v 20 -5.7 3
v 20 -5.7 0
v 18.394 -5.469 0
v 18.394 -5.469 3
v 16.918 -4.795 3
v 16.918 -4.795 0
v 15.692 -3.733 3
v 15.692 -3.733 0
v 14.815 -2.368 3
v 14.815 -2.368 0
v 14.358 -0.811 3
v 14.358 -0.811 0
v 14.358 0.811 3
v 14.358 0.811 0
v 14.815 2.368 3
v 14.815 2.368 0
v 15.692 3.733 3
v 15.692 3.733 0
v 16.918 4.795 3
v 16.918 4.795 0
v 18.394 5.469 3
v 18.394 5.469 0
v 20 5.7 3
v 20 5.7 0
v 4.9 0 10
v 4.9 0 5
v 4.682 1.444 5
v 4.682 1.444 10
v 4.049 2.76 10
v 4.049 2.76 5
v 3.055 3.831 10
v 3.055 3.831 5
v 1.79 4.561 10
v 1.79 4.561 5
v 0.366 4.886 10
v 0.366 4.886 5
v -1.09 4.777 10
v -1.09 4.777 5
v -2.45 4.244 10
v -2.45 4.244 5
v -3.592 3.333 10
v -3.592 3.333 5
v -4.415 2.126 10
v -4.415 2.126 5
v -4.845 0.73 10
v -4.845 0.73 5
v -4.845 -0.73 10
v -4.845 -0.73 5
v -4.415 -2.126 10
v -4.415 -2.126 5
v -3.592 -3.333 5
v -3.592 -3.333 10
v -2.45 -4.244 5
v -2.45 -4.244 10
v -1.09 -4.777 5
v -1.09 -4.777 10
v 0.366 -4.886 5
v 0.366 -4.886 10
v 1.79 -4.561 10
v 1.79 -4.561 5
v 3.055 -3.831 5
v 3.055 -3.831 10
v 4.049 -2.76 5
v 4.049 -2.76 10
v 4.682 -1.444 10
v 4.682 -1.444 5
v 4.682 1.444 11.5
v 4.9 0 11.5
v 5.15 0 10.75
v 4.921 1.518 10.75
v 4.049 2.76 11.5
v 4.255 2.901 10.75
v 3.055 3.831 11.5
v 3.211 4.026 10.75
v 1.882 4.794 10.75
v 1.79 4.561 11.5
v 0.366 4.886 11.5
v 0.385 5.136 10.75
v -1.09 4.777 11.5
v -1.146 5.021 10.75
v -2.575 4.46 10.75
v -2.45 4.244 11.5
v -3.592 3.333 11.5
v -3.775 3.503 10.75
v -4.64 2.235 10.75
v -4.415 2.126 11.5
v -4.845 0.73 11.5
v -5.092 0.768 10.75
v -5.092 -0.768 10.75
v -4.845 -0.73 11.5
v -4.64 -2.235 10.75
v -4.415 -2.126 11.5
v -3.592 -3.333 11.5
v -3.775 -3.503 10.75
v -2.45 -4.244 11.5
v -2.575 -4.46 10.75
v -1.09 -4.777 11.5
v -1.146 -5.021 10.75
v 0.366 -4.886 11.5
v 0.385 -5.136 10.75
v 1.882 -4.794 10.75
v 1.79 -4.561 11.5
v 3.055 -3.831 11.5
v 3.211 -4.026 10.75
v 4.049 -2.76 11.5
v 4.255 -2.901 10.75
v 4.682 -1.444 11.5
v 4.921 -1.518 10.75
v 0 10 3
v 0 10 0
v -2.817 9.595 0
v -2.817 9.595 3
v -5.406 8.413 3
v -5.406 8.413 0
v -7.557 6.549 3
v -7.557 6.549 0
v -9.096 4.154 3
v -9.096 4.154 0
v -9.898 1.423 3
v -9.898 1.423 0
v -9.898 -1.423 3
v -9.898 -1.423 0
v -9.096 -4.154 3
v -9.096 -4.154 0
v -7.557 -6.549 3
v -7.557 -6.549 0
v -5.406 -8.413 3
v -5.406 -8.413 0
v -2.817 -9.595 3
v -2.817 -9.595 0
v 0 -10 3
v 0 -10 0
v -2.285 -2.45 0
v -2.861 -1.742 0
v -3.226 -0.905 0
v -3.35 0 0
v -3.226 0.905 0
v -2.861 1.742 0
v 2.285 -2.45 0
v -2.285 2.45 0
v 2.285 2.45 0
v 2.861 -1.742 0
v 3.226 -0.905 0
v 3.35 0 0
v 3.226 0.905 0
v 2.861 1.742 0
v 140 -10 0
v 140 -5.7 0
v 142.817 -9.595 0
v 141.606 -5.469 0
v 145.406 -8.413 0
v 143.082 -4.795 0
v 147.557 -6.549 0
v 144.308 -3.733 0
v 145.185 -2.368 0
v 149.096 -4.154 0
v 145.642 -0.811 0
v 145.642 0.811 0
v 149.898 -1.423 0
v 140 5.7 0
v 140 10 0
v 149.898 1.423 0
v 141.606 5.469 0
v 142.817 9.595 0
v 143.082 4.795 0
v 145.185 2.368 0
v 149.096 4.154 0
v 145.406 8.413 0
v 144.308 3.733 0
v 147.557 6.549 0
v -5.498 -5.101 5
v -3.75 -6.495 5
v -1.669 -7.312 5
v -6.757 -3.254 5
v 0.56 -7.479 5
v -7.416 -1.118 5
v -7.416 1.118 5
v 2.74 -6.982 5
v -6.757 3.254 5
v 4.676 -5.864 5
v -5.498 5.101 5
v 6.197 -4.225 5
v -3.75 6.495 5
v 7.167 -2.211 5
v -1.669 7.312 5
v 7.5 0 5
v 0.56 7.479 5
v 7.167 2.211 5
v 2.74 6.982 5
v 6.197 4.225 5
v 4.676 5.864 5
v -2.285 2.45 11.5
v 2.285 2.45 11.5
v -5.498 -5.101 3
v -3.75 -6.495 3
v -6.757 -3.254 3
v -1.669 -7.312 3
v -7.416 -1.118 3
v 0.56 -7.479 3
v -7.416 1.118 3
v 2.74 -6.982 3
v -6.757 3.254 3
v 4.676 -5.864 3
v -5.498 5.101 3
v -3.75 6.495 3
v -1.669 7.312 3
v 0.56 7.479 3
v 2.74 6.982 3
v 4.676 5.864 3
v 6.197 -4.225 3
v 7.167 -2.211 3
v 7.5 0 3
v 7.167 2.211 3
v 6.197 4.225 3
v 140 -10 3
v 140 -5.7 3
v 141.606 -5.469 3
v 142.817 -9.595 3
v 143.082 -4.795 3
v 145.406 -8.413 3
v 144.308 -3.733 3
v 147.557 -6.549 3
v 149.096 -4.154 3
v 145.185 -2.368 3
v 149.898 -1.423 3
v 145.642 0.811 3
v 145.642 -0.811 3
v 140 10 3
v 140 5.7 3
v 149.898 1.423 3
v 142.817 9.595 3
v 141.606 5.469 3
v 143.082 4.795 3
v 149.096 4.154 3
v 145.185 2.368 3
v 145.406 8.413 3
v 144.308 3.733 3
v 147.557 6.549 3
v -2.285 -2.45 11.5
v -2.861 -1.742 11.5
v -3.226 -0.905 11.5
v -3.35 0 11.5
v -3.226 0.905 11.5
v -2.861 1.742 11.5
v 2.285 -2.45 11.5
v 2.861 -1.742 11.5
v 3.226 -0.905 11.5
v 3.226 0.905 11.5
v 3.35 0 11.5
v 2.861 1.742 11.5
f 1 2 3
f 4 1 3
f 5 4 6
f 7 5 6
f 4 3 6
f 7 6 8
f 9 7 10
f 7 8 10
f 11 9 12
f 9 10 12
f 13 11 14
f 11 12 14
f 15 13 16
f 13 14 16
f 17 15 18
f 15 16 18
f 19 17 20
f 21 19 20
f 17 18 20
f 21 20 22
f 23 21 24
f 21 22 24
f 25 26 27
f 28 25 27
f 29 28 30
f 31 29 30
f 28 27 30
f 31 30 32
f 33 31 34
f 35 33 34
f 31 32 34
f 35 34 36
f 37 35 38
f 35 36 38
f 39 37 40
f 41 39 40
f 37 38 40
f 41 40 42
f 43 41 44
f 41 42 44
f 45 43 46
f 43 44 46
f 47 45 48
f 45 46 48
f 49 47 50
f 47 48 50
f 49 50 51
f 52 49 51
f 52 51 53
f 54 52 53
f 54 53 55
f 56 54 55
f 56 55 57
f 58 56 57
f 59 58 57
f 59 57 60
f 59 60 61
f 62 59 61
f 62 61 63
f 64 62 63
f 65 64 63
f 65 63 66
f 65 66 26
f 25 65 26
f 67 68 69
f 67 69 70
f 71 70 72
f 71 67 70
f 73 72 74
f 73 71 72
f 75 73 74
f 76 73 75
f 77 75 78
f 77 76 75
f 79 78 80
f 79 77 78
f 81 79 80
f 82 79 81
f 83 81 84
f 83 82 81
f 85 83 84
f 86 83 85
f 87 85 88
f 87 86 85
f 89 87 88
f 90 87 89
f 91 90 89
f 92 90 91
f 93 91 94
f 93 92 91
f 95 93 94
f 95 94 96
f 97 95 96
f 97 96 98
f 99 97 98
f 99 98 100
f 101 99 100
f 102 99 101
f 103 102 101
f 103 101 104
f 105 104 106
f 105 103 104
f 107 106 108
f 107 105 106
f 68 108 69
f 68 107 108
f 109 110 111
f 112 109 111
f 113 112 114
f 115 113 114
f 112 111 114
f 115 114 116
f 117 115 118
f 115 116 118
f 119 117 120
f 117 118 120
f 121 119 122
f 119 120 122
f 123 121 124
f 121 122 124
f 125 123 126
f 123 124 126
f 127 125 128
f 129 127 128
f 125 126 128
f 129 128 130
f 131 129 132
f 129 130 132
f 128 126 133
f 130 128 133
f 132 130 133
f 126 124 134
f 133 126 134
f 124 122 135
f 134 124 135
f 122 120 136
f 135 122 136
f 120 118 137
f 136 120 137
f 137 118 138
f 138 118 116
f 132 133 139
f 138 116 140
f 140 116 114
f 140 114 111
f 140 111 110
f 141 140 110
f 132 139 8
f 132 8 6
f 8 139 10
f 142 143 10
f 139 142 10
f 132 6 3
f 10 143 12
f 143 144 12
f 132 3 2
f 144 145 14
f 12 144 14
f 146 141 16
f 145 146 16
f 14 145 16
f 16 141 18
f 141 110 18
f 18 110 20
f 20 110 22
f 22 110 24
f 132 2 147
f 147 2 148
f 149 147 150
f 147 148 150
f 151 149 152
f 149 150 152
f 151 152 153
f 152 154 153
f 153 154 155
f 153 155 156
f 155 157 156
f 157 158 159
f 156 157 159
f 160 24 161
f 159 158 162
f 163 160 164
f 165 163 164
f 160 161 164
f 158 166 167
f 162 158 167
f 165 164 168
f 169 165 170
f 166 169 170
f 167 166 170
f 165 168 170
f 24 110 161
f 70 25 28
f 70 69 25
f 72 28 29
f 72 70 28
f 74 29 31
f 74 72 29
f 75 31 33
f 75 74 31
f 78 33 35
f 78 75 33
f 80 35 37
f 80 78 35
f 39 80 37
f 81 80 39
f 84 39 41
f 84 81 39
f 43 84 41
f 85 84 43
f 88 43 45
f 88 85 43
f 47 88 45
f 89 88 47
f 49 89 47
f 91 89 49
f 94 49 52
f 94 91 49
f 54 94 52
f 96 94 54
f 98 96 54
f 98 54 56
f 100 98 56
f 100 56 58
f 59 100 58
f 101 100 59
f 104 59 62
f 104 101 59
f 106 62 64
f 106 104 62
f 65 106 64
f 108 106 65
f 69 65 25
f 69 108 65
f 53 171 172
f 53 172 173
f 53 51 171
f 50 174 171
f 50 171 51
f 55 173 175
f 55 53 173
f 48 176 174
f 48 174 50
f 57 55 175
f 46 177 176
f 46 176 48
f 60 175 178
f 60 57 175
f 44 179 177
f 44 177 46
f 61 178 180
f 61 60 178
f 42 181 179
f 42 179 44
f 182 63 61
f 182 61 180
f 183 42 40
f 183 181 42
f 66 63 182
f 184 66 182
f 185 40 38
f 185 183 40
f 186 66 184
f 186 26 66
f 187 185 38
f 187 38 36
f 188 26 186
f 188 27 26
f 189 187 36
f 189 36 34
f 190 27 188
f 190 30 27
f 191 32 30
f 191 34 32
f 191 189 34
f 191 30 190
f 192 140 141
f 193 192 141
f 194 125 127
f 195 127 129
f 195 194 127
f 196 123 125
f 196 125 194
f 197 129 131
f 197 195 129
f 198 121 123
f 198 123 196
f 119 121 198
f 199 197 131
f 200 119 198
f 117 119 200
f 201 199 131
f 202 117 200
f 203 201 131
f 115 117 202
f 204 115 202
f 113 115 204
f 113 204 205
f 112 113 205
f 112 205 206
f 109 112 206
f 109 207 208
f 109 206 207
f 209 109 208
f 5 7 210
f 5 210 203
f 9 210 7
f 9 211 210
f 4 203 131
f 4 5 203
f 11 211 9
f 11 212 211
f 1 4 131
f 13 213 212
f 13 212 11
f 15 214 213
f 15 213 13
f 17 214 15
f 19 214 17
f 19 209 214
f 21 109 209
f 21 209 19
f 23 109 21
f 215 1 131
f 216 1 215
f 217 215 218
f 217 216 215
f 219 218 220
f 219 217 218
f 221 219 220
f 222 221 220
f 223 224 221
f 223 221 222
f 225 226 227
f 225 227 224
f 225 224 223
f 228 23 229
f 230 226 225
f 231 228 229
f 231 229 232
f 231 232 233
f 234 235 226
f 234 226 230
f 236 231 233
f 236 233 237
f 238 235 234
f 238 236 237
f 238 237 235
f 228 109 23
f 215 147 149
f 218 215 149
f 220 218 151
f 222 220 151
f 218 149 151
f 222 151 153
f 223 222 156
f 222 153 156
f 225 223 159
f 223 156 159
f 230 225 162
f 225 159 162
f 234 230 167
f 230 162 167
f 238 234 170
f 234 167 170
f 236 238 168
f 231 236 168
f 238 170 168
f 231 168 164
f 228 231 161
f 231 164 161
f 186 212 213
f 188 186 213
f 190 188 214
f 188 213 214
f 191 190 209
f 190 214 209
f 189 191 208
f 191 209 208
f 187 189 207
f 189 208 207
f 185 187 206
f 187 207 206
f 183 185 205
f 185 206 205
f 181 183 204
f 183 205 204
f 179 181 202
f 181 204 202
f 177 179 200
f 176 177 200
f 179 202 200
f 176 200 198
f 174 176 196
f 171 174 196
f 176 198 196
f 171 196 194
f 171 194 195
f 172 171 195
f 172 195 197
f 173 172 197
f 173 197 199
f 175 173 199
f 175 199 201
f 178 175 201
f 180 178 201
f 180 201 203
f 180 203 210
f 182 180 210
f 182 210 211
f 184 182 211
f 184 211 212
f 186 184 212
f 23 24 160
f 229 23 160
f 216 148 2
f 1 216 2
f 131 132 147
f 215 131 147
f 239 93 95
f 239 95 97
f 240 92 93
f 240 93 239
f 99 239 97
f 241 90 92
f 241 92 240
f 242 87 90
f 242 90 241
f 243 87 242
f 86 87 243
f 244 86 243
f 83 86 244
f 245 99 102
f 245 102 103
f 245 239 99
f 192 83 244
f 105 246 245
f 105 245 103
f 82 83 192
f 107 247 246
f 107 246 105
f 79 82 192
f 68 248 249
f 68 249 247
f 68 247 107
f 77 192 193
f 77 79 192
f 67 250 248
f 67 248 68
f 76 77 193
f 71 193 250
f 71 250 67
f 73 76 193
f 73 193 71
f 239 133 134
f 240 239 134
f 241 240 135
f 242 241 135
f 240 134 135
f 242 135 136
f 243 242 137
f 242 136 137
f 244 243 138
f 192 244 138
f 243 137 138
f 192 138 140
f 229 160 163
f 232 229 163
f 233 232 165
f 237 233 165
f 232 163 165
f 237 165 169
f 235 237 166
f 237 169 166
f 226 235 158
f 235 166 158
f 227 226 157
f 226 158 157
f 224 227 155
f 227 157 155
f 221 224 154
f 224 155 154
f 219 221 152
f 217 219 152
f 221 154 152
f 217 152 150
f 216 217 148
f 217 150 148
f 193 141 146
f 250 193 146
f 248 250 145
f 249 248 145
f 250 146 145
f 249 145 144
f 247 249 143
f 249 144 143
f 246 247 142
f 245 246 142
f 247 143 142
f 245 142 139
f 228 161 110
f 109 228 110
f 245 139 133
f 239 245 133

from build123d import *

# Parameters (mm, degrees)
F1_R     = 7.5
F2_DEPTH = 3
F1_R_2   = 4.9
F3_DEPTH = 5
F4_DEPTH = 11.5


# Not quite as in the source:
# - a feature names something its author has since deleted; it is built from what else it names


with BuildPart() as f2:
    # F1 (on Top) → F2 (new body)
    with BuildSketch(Plane.XY):
        with BuildLine():
            Line((120, 10), (0, 10))
            ThreePointArc((0, 10), (-10, 0), (0, -10))
            Line((0, -10), (120, -10))
            Line((120, -10), (140, -10))
            ThreePointArc((140, -10), (150, 0), (140, 10))
            Line((140, 10), (120, 10))
        make_face()
        Circle(F1_R, mode=Mode.SUBTRACT)
        with BuildLine():
            ThreePointArc((20, -5.7), (14.3, 0), (20, 5.7))
            Line((20, 5.7), (120, 5.7))
            Line((120, 5.7), (140, 5.7))
            ThreePointArc((140, 5.7), (145.7, 0), (140, -5.7))
            Line((140, -5.7), (120, -5.7))
            Line((120, -5.7), (20, -5.7))
        make_face(mode=Mode.SUBTRACT)
    extrude(amount=F2_DEPTH)

    # F1 (on Top) → F3 (join)
    with BuildSketch(Plane.XY):
        Circle(F1_R)
        Circle(F1_R_2, mode=Mode.SUBTRACT)
    extrude(amount=F3_DEPTH)

    # F1 (on Top) → F4 (join)
    with BuildSketch(Plane.XY):
        Circle(F1_R_2)
        with BuildLine():
            Line((2.2847319318, -2.45), (0, -2.45))
            Line((0, -2.45), (-2.2847319318, -2.45))
            ThreePointArc((-2.2847319318, -2.45), (-3.35, 0), (-2.2847319318, 2.45))
            Line((-2.2847319318, 2.45), (0, 2.45))
            Line((0, 2.45), (2.2847319318, 2.45))
            ThreePointArc((2.2847319318, 2.45), (3.35, 0), (2.2847319318, -2.45))
        make_face(mode=Mode.SUBTRACT)
    extrude(amount=F4_DEPTH)

    # F6 (on plane+point) → F7 (revolve)
    with BuildSketch(Plane.XZ):
        Polygon((5.15, 10.75), (4.9, 11.5), (4.9, 10), align=None)
    revolve(axis=Axis((0, 0, 5.75), (0, 0, 1)))


solid = f2.part
